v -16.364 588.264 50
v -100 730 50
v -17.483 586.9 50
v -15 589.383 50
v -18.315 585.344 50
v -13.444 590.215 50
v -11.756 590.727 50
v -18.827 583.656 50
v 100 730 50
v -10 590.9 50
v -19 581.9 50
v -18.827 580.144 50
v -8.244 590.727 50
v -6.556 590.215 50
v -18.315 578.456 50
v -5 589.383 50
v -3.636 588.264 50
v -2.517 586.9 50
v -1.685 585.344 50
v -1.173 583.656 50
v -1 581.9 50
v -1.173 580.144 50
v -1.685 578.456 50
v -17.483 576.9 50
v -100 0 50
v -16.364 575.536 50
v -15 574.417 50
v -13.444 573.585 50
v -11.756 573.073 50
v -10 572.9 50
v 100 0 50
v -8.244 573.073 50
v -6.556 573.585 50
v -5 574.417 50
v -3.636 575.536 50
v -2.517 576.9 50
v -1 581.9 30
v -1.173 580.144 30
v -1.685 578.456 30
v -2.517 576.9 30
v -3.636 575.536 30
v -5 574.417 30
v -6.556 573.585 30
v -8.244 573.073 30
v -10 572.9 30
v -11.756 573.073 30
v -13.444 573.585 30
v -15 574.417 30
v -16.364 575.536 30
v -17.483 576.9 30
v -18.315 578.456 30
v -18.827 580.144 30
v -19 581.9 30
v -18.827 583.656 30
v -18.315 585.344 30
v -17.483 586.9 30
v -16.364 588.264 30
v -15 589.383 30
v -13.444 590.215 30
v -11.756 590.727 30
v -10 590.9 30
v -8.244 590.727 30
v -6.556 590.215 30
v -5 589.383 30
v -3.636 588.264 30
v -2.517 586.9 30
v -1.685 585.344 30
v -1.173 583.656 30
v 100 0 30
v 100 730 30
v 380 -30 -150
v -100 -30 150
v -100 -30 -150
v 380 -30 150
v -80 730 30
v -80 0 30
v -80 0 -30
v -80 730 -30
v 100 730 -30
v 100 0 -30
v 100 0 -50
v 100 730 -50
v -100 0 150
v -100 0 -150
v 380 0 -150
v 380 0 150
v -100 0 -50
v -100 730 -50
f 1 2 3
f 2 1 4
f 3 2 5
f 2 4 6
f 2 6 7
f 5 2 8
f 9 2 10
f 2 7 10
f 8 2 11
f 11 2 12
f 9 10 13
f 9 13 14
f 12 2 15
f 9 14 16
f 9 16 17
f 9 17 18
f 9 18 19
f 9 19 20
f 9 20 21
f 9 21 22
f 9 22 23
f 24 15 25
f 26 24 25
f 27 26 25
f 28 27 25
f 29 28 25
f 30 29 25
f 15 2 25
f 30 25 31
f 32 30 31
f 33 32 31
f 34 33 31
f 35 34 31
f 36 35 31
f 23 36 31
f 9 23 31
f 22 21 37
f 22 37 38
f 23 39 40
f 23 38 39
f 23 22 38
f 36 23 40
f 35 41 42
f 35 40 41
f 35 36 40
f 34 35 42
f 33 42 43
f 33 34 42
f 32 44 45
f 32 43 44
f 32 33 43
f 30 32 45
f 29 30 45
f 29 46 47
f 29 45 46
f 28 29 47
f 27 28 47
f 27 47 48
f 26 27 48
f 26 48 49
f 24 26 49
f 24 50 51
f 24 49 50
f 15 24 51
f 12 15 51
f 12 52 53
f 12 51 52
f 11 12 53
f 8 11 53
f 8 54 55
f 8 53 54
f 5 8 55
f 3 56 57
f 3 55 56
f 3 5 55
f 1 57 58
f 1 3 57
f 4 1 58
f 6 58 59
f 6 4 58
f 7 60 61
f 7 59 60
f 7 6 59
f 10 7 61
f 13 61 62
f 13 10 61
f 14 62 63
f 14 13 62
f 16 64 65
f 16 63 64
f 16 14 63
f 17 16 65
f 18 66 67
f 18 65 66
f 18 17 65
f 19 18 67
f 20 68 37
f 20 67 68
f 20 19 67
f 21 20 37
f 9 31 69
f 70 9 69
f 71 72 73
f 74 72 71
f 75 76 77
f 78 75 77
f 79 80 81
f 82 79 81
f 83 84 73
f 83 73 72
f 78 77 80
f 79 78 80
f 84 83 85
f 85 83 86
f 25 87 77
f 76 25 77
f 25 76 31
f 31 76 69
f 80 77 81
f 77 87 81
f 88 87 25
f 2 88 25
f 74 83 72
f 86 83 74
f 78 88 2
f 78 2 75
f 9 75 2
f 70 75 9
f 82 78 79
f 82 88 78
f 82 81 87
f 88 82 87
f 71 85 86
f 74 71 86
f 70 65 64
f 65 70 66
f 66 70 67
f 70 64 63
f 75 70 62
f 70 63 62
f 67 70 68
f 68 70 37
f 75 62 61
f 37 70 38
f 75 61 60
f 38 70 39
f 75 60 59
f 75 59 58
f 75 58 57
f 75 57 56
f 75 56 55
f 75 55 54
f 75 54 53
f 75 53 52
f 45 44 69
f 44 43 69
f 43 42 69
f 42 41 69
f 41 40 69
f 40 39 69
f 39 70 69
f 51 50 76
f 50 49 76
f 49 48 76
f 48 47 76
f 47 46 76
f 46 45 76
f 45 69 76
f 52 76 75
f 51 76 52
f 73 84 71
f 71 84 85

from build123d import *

# Parameters (mm, degrees)
BOSS_EXTRUDE1_DEPTH     = 730
SKETCH2_W               = 480
SKETCH2_H               = 300
BOSS_EXTRUDE2_DEPTH     = 30
CUT_EXTRUDE1_DEPTH      = 29
CUT_EXTRUDE1_DEPTH_BACK = 23
SKETCH5_R               = 9


with BuildPart() as part:
    # Sketch1 → Boss-Extrude1 (new body)
    with BuildSketch(Plane(origin=(0, 0, 0), x_dir=(1, 0, 0), z_dir=(0, 1, 0))):
        Polygon((-80, 30), (100, 30), (100, 50), (-100, 50), (-100, -50), (100, -50), (100, -30), (-80, -30), align=None)
    extrude(amount=BOSS_EXTRUDE1_DEPTH)

    # Sketch5 → Cut-Extrude1 (cut, two sides: drawn at the far end of the back side and taken through both)
    with BuildSketch(Plane(origin=(0, 0, 30), x_dir=(-1, 0, 0), z_dir=(0, 0, -1)).offset(-CUT_EXTRUDE1_DEPTH_BACK)):
        with Locations(Location((10, 581.9, 0), (0, 0, 180))):
            Circle(SKETCH5_R)
    extrude(amount=CUT_EXTRUDE1_DEPTH + CUT_EXTRUDE1_DEPTH_BACK, mode=Mode.SUBTRACT)


with BuildPart() as body_2:
    # Sketch2 → Boss-Extrude2 (new body)
    with BuildSketch(Plane.XZ):
        with Locations((140, 0)):
            Rectangle(SKETCH2_W, SKETCH2_H)
    extrude(amount=BOSS_EXTRUDE2_DEPTH)


solid = Compound([part.part, body_2.part])
